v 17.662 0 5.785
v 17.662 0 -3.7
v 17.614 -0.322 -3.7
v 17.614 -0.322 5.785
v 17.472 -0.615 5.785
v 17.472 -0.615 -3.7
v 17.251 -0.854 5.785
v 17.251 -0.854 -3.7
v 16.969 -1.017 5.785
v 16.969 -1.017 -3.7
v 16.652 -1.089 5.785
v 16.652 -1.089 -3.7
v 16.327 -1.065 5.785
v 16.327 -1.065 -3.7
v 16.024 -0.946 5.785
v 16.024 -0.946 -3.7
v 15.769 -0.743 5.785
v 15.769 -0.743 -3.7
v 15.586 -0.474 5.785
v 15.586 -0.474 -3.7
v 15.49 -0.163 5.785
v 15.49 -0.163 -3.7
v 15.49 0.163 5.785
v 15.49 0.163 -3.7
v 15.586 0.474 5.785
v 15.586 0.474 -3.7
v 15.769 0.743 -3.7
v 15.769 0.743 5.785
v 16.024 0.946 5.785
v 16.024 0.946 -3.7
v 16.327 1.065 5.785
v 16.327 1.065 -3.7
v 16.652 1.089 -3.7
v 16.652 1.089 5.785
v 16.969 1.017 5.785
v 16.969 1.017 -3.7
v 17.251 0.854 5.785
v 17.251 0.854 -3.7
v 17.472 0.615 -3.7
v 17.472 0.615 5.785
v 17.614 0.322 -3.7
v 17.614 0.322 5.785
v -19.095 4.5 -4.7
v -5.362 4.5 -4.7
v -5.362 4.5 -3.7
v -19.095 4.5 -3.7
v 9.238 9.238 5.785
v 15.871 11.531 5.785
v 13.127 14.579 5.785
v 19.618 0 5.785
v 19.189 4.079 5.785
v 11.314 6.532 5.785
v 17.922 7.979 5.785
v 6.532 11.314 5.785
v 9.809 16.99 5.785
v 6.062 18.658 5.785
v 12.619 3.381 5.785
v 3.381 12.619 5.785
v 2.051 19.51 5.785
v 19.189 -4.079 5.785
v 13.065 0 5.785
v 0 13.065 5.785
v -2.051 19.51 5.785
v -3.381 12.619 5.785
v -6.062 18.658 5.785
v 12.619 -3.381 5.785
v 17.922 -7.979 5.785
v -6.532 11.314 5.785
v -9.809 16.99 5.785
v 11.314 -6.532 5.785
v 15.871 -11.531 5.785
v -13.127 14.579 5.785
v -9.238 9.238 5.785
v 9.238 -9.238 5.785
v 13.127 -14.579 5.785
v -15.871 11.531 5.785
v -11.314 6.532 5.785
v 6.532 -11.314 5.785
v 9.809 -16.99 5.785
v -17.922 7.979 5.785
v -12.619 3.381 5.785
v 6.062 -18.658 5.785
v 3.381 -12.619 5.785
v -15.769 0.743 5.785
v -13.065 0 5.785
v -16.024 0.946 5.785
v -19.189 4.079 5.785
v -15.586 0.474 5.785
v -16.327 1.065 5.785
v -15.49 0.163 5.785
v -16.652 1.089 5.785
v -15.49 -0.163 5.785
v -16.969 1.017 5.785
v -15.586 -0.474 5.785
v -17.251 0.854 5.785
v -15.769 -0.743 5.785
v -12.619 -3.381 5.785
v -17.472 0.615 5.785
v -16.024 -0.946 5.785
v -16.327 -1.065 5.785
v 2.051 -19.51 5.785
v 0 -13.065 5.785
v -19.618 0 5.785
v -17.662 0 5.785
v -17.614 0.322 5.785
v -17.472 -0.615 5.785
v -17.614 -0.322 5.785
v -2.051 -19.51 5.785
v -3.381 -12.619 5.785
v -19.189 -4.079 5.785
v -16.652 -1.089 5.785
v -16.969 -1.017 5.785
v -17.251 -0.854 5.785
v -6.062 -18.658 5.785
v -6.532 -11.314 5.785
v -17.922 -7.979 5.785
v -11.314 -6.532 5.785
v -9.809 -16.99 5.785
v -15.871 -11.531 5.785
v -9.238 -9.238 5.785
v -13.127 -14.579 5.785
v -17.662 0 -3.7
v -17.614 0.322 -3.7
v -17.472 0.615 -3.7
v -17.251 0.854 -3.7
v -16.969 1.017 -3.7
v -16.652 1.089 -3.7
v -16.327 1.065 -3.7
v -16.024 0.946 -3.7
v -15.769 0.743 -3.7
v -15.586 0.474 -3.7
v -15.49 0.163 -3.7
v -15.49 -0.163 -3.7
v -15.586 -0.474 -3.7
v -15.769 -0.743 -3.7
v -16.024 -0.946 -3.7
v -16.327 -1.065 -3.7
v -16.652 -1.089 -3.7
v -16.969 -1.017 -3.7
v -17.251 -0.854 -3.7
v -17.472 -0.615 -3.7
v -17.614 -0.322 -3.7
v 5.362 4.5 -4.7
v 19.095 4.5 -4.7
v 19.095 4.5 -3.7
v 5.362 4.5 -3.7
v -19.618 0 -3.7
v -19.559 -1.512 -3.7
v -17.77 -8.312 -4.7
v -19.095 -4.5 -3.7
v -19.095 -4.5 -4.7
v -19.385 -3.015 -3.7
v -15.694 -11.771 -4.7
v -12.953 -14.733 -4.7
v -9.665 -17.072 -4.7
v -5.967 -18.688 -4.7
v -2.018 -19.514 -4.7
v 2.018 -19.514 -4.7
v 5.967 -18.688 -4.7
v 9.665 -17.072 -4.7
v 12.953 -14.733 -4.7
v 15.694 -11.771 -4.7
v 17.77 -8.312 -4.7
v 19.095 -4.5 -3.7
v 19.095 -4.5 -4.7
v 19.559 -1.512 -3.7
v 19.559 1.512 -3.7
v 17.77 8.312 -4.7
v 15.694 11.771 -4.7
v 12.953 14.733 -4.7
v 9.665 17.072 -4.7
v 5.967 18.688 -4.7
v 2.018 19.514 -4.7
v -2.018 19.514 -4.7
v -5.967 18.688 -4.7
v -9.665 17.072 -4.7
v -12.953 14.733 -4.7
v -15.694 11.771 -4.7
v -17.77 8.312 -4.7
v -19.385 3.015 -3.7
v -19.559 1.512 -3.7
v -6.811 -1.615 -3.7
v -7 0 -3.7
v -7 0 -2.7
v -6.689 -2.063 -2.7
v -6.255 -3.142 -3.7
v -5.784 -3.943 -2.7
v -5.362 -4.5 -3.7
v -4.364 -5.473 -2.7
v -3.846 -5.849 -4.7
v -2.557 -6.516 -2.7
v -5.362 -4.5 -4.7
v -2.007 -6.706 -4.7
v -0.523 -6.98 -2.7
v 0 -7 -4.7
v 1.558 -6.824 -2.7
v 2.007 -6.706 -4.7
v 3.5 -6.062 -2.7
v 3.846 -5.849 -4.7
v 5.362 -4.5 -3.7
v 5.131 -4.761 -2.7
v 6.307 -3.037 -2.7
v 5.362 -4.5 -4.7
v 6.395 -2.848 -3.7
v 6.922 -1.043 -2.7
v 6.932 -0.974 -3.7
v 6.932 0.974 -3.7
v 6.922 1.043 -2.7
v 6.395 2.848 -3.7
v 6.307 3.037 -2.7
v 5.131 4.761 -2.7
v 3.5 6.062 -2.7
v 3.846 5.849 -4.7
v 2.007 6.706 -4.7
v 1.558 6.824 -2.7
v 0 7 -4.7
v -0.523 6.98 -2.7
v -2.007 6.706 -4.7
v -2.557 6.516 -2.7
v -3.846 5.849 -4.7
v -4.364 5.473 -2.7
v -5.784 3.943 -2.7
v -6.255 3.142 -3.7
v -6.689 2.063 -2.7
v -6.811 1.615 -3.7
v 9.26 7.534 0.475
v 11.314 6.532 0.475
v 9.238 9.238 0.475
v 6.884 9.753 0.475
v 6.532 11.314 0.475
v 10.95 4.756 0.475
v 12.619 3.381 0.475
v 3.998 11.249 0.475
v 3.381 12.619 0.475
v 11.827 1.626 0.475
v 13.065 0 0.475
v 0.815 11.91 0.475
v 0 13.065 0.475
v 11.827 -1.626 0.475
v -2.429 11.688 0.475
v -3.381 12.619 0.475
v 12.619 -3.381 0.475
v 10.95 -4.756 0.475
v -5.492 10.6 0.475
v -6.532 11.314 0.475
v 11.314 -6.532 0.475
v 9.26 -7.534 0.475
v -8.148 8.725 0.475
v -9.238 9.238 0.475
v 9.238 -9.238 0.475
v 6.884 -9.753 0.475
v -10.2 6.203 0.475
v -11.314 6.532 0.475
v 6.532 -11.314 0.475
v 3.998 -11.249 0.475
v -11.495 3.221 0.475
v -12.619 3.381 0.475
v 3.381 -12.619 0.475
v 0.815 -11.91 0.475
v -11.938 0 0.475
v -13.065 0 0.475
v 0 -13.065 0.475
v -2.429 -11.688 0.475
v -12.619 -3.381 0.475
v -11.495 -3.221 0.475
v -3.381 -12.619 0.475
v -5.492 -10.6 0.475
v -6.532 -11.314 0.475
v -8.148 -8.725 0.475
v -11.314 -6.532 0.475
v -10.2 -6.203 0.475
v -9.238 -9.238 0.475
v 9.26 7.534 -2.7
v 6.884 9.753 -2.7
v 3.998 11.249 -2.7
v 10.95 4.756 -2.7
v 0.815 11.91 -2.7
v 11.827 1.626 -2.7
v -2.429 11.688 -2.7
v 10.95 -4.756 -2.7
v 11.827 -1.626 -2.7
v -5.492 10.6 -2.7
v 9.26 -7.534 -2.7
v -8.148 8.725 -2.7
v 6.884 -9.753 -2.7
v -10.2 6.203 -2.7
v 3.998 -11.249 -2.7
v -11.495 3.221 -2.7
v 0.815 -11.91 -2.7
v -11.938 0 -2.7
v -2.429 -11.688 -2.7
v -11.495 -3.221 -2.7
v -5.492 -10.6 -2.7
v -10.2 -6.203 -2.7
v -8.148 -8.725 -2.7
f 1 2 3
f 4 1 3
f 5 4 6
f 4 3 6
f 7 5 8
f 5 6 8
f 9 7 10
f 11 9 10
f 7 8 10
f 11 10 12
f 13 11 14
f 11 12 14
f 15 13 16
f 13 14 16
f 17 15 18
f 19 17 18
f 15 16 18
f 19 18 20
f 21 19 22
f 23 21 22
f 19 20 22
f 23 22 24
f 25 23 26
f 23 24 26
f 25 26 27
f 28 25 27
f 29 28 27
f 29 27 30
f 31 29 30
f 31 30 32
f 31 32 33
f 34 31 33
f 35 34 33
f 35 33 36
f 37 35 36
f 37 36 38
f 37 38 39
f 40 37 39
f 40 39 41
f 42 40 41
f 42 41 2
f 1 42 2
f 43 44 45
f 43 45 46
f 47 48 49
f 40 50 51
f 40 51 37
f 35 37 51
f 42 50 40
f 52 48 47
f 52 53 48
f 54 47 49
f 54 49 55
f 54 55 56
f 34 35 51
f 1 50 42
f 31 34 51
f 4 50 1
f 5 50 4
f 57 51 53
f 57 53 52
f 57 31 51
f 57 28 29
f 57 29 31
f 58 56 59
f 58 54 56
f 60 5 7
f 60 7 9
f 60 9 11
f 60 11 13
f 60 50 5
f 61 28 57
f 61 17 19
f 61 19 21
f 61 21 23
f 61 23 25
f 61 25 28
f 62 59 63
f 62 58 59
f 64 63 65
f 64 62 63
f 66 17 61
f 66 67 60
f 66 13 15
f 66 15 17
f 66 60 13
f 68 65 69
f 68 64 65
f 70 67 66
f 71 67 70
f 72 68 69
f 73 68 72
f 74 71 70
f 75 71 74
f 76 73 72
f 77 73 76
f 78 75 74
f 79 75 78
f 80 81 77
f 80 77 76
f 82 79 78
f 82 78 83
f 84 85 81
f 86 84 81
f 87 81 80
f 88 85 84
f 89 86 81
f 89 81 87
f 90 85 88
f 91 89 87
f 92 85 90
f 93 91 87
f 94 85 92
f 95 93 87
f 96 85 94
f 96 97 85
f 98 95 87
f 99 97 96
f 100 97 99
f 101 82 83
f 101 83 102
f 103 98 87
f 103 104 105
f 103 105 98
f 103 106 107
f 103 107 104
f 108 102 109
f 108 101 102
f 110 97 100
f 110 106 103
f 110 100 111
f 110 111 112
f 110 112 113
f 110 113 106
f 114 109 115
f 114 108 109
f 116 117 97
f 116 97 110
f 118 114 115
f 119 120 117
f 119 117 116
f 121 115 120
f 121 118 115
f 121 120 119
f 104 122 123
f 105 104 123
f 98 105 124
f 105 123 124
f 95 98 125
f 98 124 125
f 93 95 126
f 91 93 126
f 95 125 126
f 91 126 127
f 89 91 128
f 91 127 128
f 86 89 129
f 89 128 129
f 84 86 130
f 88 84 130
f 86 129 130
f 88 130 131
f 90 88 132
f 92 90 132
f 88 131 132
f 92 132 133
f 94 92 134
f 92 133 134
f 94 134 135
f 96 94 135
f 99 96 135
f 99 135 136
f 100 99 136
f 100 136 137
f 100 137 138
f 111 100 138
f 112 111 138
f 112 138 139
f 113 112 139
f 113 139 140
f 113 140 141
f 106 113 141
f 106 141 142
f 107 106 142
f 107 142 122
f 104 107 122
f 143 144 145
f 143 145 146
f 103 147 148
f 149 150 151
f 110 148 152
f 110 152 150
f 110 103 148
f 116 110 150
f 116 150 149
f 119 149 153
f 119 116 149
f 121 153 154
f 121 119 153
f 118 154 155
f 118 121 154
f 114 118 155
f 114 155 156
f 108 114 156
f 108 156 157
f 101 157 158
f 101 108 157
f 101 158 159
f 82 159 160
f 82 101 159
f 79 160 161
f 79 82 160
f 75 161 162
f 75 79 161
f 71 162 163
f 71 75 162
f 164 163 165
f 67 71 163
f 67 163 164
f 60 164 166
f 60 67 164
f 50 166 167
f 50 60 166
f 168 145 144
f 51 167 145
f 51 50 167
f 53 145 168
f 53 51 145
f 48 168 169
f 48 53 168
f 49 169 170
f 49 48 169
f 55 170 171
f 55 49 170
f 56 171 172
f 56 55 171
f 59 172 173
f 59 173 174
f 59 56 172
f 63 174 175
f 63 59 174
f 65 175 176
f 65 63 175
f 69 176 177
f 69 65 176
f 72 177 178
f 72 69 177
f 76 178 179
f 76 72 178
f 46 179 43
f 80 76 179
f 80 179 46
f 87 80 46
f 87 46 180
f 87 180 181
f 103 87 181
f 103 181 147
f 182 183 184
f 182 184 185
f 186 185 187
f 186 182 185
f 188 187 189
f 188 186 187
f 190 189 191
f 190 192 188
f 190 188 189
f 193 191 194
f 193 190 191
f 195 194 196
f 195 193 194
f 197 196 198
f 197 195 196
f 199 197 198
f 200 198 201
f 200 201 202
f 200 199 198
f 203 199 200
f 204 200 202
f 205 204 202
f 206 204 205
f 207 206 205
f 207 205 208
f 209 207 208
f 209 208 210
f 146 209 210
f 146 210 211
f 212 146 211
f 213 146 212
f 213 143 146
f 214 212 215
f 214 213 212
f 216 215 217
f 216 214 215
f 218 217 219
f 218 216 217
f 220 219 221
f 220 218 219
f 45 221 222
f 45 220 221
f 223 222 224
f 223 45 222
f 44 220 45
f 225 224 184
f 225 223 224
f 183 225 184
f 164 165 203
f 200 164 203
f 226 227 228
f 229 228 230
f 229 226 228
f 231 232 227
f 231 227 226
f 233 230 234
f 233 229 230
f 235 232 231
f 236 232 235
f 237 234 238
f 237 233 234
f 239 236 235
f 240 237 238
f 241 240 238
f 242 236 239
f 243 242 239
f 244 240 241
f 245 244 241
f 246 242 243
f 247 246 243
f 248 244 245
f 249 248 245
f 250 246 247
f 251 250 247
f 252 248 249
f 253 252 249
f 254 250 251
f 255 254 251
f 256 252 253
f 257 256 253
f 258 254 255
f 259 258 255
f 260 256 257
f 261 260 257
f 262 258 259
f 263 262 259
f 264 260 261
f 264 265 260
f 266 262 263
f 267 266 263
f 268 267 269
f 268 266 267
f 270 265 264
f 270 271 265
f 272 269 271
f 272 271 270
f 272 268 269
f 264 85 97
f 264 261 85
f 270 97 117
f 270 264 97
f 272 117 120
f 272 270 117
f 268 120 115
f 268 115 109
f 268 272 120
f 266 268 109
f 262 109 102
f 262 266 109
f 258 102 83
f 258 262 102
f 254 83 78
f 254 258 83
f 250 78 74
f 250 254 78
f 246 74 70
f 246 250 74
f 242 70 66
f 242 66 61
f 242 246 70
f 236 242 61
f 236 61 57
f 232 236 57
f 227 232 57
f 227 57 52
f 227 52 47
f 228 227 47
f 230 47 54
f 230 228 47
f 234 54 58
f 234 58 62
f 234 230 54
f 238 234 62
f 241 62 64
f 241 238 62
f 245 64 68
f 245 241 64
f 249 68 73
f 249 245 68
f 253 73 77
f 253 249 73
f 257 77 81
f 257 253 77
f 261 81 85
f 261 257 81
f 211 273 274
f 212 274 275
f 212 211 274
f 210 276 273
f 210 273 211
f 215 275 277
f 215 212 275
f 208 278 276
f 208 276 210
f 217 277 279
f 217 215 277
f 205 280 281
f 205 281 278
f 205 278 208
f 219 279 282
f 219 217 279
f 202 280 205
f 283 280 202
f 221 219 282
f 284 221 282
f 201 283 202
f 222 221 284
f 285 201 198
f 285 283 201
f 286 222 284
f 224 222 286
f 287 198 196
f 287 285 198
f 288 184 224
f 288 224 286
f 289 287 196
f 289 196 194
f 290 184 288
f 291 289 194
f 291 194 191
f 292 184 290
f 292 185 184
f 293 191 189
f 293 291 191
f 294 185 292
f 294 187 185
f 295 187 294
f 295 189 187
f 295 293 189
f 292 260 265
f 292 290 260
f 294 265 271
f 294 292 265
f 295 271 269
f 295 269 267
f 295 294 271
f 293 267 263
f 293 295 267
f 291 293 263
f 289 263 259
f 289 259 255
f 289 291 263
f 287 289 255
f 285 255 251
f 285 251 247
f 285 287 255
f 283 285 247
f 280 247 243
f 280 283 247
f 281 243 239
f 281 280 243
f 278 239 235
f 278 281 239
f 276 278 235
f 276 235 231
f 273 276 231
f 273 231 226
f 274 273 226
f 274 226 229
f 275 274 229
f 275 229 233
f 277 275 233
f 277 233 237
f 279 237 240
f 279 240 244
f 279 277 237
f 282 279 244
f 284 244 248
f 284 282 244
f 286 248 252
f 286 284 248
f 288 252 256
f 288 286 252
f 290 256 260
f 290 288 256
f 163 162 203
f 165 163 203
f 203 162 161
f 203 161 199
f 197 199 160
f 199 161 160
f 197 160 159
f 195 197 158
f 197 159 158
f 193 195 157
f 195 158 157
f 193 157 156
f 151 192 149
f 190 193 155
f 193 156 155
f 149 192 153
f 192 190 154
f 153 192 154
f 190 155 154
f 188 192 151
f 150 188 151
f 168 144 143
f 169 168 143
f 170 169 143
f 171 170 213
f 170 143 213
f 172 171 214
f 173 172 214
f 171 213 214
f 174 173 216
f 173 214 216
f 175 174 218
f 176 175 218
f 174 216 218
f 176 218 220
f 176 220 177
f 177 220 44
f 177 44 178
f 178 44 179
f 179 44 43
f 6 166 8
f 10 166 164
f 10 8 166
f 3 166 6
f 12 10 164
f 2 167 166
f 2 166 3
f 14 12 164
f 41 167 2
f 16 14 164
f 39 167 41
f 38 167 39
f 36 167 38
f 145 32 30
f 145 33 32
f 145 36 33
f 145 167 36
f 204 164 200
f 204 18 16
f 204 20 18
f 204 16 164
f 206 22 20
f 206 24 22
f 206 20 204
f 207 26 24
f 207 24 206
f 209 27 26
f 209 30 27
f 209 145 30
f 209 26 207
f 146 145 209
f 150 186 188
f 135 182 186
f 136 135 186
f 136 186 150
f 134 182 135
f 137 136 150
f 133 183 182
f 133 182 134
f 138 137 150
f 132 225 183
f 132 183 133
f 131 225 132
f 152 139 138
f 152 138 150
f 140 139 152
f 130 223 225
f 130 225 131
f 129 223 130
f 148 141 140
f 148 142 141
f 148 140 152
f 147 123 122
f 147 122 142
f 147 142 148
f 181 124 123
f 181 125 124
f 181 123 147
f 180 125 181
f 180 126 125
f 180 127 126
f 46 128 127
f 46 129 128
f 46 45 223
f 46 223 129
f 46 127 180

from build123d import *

# Parameters (mm, degrees)
SKETCH1_W          = 12.617819502
SKETCH1_H          = 2
SKETCH1_W_2        = 6.5532
SKETCH1_H_2        = 5.31
SKETCH2_R          = 1.0922
CUT_EXTRUDE1_DEPTH = 30.658943154
SKETCH3_W          = 45.123892984
SKETCH3_H          = 9
CUT_EXTRUDE2_DEPTH = 1


with BuildPart() as part:
    # Sketch1 → Revolve1 (revolve)
    with BuildSketch(Plane(origin=(0, 0, 0), x_dir=(1, 0, 0), z_dir=(0, 1, 0))):
        with Locations((-13.308909751, 3.700473465)):
            Rectangle(SKETCH1_W, SKETCH1_H)
        Polygon((-11.938, 2.700473465), (-19.617819502, 2.700473465), (-19.617819502, -0.474526535), (-13.064619502, -0.474526535), (-11.938, -0.474526535), align=None)
        with Locations((-16.341219502, -3.129526535)):
            Rectangle(SKETCH1_W_2, SKETCH1_H_2)
    revolve(axis=Axis((0, 0, -25.411285606), (0, 0, 1)))

    # Sketch2 → Cut-Extrude1 (cut, through all)
    with BuildSketch(Plane(origin=(0, 0, -4.700473465), x_dir=(-1, 0, 0), z_dir=(0, 0, -1))):
        with Locations((16.57, 0)):
            Circle(SKETCH2_R)
        with Locations(Location((-16.57, 0, 0), (0, 0, 180))):
            Circle(SKETCH2_R)
    extrude(amount=-CUT_EXTRUDE1_DEPTH, mode=Mode.SUBTRACT)

    # Sketch3 → Cut-Extrude2 (cut)
    with BuildSketch(Plane(origin=(0, 0, -4.700473465), x_dir=(-1, 0, 0), z_dir=(0, 0, -1))):
        Rectangle(SKETCH3_W, SKETCH3_H)
    extrude(amount=-CUT_EXTRUDE2_DEPTH, mode=Mode.SUBTRACT)


solid = part.part
